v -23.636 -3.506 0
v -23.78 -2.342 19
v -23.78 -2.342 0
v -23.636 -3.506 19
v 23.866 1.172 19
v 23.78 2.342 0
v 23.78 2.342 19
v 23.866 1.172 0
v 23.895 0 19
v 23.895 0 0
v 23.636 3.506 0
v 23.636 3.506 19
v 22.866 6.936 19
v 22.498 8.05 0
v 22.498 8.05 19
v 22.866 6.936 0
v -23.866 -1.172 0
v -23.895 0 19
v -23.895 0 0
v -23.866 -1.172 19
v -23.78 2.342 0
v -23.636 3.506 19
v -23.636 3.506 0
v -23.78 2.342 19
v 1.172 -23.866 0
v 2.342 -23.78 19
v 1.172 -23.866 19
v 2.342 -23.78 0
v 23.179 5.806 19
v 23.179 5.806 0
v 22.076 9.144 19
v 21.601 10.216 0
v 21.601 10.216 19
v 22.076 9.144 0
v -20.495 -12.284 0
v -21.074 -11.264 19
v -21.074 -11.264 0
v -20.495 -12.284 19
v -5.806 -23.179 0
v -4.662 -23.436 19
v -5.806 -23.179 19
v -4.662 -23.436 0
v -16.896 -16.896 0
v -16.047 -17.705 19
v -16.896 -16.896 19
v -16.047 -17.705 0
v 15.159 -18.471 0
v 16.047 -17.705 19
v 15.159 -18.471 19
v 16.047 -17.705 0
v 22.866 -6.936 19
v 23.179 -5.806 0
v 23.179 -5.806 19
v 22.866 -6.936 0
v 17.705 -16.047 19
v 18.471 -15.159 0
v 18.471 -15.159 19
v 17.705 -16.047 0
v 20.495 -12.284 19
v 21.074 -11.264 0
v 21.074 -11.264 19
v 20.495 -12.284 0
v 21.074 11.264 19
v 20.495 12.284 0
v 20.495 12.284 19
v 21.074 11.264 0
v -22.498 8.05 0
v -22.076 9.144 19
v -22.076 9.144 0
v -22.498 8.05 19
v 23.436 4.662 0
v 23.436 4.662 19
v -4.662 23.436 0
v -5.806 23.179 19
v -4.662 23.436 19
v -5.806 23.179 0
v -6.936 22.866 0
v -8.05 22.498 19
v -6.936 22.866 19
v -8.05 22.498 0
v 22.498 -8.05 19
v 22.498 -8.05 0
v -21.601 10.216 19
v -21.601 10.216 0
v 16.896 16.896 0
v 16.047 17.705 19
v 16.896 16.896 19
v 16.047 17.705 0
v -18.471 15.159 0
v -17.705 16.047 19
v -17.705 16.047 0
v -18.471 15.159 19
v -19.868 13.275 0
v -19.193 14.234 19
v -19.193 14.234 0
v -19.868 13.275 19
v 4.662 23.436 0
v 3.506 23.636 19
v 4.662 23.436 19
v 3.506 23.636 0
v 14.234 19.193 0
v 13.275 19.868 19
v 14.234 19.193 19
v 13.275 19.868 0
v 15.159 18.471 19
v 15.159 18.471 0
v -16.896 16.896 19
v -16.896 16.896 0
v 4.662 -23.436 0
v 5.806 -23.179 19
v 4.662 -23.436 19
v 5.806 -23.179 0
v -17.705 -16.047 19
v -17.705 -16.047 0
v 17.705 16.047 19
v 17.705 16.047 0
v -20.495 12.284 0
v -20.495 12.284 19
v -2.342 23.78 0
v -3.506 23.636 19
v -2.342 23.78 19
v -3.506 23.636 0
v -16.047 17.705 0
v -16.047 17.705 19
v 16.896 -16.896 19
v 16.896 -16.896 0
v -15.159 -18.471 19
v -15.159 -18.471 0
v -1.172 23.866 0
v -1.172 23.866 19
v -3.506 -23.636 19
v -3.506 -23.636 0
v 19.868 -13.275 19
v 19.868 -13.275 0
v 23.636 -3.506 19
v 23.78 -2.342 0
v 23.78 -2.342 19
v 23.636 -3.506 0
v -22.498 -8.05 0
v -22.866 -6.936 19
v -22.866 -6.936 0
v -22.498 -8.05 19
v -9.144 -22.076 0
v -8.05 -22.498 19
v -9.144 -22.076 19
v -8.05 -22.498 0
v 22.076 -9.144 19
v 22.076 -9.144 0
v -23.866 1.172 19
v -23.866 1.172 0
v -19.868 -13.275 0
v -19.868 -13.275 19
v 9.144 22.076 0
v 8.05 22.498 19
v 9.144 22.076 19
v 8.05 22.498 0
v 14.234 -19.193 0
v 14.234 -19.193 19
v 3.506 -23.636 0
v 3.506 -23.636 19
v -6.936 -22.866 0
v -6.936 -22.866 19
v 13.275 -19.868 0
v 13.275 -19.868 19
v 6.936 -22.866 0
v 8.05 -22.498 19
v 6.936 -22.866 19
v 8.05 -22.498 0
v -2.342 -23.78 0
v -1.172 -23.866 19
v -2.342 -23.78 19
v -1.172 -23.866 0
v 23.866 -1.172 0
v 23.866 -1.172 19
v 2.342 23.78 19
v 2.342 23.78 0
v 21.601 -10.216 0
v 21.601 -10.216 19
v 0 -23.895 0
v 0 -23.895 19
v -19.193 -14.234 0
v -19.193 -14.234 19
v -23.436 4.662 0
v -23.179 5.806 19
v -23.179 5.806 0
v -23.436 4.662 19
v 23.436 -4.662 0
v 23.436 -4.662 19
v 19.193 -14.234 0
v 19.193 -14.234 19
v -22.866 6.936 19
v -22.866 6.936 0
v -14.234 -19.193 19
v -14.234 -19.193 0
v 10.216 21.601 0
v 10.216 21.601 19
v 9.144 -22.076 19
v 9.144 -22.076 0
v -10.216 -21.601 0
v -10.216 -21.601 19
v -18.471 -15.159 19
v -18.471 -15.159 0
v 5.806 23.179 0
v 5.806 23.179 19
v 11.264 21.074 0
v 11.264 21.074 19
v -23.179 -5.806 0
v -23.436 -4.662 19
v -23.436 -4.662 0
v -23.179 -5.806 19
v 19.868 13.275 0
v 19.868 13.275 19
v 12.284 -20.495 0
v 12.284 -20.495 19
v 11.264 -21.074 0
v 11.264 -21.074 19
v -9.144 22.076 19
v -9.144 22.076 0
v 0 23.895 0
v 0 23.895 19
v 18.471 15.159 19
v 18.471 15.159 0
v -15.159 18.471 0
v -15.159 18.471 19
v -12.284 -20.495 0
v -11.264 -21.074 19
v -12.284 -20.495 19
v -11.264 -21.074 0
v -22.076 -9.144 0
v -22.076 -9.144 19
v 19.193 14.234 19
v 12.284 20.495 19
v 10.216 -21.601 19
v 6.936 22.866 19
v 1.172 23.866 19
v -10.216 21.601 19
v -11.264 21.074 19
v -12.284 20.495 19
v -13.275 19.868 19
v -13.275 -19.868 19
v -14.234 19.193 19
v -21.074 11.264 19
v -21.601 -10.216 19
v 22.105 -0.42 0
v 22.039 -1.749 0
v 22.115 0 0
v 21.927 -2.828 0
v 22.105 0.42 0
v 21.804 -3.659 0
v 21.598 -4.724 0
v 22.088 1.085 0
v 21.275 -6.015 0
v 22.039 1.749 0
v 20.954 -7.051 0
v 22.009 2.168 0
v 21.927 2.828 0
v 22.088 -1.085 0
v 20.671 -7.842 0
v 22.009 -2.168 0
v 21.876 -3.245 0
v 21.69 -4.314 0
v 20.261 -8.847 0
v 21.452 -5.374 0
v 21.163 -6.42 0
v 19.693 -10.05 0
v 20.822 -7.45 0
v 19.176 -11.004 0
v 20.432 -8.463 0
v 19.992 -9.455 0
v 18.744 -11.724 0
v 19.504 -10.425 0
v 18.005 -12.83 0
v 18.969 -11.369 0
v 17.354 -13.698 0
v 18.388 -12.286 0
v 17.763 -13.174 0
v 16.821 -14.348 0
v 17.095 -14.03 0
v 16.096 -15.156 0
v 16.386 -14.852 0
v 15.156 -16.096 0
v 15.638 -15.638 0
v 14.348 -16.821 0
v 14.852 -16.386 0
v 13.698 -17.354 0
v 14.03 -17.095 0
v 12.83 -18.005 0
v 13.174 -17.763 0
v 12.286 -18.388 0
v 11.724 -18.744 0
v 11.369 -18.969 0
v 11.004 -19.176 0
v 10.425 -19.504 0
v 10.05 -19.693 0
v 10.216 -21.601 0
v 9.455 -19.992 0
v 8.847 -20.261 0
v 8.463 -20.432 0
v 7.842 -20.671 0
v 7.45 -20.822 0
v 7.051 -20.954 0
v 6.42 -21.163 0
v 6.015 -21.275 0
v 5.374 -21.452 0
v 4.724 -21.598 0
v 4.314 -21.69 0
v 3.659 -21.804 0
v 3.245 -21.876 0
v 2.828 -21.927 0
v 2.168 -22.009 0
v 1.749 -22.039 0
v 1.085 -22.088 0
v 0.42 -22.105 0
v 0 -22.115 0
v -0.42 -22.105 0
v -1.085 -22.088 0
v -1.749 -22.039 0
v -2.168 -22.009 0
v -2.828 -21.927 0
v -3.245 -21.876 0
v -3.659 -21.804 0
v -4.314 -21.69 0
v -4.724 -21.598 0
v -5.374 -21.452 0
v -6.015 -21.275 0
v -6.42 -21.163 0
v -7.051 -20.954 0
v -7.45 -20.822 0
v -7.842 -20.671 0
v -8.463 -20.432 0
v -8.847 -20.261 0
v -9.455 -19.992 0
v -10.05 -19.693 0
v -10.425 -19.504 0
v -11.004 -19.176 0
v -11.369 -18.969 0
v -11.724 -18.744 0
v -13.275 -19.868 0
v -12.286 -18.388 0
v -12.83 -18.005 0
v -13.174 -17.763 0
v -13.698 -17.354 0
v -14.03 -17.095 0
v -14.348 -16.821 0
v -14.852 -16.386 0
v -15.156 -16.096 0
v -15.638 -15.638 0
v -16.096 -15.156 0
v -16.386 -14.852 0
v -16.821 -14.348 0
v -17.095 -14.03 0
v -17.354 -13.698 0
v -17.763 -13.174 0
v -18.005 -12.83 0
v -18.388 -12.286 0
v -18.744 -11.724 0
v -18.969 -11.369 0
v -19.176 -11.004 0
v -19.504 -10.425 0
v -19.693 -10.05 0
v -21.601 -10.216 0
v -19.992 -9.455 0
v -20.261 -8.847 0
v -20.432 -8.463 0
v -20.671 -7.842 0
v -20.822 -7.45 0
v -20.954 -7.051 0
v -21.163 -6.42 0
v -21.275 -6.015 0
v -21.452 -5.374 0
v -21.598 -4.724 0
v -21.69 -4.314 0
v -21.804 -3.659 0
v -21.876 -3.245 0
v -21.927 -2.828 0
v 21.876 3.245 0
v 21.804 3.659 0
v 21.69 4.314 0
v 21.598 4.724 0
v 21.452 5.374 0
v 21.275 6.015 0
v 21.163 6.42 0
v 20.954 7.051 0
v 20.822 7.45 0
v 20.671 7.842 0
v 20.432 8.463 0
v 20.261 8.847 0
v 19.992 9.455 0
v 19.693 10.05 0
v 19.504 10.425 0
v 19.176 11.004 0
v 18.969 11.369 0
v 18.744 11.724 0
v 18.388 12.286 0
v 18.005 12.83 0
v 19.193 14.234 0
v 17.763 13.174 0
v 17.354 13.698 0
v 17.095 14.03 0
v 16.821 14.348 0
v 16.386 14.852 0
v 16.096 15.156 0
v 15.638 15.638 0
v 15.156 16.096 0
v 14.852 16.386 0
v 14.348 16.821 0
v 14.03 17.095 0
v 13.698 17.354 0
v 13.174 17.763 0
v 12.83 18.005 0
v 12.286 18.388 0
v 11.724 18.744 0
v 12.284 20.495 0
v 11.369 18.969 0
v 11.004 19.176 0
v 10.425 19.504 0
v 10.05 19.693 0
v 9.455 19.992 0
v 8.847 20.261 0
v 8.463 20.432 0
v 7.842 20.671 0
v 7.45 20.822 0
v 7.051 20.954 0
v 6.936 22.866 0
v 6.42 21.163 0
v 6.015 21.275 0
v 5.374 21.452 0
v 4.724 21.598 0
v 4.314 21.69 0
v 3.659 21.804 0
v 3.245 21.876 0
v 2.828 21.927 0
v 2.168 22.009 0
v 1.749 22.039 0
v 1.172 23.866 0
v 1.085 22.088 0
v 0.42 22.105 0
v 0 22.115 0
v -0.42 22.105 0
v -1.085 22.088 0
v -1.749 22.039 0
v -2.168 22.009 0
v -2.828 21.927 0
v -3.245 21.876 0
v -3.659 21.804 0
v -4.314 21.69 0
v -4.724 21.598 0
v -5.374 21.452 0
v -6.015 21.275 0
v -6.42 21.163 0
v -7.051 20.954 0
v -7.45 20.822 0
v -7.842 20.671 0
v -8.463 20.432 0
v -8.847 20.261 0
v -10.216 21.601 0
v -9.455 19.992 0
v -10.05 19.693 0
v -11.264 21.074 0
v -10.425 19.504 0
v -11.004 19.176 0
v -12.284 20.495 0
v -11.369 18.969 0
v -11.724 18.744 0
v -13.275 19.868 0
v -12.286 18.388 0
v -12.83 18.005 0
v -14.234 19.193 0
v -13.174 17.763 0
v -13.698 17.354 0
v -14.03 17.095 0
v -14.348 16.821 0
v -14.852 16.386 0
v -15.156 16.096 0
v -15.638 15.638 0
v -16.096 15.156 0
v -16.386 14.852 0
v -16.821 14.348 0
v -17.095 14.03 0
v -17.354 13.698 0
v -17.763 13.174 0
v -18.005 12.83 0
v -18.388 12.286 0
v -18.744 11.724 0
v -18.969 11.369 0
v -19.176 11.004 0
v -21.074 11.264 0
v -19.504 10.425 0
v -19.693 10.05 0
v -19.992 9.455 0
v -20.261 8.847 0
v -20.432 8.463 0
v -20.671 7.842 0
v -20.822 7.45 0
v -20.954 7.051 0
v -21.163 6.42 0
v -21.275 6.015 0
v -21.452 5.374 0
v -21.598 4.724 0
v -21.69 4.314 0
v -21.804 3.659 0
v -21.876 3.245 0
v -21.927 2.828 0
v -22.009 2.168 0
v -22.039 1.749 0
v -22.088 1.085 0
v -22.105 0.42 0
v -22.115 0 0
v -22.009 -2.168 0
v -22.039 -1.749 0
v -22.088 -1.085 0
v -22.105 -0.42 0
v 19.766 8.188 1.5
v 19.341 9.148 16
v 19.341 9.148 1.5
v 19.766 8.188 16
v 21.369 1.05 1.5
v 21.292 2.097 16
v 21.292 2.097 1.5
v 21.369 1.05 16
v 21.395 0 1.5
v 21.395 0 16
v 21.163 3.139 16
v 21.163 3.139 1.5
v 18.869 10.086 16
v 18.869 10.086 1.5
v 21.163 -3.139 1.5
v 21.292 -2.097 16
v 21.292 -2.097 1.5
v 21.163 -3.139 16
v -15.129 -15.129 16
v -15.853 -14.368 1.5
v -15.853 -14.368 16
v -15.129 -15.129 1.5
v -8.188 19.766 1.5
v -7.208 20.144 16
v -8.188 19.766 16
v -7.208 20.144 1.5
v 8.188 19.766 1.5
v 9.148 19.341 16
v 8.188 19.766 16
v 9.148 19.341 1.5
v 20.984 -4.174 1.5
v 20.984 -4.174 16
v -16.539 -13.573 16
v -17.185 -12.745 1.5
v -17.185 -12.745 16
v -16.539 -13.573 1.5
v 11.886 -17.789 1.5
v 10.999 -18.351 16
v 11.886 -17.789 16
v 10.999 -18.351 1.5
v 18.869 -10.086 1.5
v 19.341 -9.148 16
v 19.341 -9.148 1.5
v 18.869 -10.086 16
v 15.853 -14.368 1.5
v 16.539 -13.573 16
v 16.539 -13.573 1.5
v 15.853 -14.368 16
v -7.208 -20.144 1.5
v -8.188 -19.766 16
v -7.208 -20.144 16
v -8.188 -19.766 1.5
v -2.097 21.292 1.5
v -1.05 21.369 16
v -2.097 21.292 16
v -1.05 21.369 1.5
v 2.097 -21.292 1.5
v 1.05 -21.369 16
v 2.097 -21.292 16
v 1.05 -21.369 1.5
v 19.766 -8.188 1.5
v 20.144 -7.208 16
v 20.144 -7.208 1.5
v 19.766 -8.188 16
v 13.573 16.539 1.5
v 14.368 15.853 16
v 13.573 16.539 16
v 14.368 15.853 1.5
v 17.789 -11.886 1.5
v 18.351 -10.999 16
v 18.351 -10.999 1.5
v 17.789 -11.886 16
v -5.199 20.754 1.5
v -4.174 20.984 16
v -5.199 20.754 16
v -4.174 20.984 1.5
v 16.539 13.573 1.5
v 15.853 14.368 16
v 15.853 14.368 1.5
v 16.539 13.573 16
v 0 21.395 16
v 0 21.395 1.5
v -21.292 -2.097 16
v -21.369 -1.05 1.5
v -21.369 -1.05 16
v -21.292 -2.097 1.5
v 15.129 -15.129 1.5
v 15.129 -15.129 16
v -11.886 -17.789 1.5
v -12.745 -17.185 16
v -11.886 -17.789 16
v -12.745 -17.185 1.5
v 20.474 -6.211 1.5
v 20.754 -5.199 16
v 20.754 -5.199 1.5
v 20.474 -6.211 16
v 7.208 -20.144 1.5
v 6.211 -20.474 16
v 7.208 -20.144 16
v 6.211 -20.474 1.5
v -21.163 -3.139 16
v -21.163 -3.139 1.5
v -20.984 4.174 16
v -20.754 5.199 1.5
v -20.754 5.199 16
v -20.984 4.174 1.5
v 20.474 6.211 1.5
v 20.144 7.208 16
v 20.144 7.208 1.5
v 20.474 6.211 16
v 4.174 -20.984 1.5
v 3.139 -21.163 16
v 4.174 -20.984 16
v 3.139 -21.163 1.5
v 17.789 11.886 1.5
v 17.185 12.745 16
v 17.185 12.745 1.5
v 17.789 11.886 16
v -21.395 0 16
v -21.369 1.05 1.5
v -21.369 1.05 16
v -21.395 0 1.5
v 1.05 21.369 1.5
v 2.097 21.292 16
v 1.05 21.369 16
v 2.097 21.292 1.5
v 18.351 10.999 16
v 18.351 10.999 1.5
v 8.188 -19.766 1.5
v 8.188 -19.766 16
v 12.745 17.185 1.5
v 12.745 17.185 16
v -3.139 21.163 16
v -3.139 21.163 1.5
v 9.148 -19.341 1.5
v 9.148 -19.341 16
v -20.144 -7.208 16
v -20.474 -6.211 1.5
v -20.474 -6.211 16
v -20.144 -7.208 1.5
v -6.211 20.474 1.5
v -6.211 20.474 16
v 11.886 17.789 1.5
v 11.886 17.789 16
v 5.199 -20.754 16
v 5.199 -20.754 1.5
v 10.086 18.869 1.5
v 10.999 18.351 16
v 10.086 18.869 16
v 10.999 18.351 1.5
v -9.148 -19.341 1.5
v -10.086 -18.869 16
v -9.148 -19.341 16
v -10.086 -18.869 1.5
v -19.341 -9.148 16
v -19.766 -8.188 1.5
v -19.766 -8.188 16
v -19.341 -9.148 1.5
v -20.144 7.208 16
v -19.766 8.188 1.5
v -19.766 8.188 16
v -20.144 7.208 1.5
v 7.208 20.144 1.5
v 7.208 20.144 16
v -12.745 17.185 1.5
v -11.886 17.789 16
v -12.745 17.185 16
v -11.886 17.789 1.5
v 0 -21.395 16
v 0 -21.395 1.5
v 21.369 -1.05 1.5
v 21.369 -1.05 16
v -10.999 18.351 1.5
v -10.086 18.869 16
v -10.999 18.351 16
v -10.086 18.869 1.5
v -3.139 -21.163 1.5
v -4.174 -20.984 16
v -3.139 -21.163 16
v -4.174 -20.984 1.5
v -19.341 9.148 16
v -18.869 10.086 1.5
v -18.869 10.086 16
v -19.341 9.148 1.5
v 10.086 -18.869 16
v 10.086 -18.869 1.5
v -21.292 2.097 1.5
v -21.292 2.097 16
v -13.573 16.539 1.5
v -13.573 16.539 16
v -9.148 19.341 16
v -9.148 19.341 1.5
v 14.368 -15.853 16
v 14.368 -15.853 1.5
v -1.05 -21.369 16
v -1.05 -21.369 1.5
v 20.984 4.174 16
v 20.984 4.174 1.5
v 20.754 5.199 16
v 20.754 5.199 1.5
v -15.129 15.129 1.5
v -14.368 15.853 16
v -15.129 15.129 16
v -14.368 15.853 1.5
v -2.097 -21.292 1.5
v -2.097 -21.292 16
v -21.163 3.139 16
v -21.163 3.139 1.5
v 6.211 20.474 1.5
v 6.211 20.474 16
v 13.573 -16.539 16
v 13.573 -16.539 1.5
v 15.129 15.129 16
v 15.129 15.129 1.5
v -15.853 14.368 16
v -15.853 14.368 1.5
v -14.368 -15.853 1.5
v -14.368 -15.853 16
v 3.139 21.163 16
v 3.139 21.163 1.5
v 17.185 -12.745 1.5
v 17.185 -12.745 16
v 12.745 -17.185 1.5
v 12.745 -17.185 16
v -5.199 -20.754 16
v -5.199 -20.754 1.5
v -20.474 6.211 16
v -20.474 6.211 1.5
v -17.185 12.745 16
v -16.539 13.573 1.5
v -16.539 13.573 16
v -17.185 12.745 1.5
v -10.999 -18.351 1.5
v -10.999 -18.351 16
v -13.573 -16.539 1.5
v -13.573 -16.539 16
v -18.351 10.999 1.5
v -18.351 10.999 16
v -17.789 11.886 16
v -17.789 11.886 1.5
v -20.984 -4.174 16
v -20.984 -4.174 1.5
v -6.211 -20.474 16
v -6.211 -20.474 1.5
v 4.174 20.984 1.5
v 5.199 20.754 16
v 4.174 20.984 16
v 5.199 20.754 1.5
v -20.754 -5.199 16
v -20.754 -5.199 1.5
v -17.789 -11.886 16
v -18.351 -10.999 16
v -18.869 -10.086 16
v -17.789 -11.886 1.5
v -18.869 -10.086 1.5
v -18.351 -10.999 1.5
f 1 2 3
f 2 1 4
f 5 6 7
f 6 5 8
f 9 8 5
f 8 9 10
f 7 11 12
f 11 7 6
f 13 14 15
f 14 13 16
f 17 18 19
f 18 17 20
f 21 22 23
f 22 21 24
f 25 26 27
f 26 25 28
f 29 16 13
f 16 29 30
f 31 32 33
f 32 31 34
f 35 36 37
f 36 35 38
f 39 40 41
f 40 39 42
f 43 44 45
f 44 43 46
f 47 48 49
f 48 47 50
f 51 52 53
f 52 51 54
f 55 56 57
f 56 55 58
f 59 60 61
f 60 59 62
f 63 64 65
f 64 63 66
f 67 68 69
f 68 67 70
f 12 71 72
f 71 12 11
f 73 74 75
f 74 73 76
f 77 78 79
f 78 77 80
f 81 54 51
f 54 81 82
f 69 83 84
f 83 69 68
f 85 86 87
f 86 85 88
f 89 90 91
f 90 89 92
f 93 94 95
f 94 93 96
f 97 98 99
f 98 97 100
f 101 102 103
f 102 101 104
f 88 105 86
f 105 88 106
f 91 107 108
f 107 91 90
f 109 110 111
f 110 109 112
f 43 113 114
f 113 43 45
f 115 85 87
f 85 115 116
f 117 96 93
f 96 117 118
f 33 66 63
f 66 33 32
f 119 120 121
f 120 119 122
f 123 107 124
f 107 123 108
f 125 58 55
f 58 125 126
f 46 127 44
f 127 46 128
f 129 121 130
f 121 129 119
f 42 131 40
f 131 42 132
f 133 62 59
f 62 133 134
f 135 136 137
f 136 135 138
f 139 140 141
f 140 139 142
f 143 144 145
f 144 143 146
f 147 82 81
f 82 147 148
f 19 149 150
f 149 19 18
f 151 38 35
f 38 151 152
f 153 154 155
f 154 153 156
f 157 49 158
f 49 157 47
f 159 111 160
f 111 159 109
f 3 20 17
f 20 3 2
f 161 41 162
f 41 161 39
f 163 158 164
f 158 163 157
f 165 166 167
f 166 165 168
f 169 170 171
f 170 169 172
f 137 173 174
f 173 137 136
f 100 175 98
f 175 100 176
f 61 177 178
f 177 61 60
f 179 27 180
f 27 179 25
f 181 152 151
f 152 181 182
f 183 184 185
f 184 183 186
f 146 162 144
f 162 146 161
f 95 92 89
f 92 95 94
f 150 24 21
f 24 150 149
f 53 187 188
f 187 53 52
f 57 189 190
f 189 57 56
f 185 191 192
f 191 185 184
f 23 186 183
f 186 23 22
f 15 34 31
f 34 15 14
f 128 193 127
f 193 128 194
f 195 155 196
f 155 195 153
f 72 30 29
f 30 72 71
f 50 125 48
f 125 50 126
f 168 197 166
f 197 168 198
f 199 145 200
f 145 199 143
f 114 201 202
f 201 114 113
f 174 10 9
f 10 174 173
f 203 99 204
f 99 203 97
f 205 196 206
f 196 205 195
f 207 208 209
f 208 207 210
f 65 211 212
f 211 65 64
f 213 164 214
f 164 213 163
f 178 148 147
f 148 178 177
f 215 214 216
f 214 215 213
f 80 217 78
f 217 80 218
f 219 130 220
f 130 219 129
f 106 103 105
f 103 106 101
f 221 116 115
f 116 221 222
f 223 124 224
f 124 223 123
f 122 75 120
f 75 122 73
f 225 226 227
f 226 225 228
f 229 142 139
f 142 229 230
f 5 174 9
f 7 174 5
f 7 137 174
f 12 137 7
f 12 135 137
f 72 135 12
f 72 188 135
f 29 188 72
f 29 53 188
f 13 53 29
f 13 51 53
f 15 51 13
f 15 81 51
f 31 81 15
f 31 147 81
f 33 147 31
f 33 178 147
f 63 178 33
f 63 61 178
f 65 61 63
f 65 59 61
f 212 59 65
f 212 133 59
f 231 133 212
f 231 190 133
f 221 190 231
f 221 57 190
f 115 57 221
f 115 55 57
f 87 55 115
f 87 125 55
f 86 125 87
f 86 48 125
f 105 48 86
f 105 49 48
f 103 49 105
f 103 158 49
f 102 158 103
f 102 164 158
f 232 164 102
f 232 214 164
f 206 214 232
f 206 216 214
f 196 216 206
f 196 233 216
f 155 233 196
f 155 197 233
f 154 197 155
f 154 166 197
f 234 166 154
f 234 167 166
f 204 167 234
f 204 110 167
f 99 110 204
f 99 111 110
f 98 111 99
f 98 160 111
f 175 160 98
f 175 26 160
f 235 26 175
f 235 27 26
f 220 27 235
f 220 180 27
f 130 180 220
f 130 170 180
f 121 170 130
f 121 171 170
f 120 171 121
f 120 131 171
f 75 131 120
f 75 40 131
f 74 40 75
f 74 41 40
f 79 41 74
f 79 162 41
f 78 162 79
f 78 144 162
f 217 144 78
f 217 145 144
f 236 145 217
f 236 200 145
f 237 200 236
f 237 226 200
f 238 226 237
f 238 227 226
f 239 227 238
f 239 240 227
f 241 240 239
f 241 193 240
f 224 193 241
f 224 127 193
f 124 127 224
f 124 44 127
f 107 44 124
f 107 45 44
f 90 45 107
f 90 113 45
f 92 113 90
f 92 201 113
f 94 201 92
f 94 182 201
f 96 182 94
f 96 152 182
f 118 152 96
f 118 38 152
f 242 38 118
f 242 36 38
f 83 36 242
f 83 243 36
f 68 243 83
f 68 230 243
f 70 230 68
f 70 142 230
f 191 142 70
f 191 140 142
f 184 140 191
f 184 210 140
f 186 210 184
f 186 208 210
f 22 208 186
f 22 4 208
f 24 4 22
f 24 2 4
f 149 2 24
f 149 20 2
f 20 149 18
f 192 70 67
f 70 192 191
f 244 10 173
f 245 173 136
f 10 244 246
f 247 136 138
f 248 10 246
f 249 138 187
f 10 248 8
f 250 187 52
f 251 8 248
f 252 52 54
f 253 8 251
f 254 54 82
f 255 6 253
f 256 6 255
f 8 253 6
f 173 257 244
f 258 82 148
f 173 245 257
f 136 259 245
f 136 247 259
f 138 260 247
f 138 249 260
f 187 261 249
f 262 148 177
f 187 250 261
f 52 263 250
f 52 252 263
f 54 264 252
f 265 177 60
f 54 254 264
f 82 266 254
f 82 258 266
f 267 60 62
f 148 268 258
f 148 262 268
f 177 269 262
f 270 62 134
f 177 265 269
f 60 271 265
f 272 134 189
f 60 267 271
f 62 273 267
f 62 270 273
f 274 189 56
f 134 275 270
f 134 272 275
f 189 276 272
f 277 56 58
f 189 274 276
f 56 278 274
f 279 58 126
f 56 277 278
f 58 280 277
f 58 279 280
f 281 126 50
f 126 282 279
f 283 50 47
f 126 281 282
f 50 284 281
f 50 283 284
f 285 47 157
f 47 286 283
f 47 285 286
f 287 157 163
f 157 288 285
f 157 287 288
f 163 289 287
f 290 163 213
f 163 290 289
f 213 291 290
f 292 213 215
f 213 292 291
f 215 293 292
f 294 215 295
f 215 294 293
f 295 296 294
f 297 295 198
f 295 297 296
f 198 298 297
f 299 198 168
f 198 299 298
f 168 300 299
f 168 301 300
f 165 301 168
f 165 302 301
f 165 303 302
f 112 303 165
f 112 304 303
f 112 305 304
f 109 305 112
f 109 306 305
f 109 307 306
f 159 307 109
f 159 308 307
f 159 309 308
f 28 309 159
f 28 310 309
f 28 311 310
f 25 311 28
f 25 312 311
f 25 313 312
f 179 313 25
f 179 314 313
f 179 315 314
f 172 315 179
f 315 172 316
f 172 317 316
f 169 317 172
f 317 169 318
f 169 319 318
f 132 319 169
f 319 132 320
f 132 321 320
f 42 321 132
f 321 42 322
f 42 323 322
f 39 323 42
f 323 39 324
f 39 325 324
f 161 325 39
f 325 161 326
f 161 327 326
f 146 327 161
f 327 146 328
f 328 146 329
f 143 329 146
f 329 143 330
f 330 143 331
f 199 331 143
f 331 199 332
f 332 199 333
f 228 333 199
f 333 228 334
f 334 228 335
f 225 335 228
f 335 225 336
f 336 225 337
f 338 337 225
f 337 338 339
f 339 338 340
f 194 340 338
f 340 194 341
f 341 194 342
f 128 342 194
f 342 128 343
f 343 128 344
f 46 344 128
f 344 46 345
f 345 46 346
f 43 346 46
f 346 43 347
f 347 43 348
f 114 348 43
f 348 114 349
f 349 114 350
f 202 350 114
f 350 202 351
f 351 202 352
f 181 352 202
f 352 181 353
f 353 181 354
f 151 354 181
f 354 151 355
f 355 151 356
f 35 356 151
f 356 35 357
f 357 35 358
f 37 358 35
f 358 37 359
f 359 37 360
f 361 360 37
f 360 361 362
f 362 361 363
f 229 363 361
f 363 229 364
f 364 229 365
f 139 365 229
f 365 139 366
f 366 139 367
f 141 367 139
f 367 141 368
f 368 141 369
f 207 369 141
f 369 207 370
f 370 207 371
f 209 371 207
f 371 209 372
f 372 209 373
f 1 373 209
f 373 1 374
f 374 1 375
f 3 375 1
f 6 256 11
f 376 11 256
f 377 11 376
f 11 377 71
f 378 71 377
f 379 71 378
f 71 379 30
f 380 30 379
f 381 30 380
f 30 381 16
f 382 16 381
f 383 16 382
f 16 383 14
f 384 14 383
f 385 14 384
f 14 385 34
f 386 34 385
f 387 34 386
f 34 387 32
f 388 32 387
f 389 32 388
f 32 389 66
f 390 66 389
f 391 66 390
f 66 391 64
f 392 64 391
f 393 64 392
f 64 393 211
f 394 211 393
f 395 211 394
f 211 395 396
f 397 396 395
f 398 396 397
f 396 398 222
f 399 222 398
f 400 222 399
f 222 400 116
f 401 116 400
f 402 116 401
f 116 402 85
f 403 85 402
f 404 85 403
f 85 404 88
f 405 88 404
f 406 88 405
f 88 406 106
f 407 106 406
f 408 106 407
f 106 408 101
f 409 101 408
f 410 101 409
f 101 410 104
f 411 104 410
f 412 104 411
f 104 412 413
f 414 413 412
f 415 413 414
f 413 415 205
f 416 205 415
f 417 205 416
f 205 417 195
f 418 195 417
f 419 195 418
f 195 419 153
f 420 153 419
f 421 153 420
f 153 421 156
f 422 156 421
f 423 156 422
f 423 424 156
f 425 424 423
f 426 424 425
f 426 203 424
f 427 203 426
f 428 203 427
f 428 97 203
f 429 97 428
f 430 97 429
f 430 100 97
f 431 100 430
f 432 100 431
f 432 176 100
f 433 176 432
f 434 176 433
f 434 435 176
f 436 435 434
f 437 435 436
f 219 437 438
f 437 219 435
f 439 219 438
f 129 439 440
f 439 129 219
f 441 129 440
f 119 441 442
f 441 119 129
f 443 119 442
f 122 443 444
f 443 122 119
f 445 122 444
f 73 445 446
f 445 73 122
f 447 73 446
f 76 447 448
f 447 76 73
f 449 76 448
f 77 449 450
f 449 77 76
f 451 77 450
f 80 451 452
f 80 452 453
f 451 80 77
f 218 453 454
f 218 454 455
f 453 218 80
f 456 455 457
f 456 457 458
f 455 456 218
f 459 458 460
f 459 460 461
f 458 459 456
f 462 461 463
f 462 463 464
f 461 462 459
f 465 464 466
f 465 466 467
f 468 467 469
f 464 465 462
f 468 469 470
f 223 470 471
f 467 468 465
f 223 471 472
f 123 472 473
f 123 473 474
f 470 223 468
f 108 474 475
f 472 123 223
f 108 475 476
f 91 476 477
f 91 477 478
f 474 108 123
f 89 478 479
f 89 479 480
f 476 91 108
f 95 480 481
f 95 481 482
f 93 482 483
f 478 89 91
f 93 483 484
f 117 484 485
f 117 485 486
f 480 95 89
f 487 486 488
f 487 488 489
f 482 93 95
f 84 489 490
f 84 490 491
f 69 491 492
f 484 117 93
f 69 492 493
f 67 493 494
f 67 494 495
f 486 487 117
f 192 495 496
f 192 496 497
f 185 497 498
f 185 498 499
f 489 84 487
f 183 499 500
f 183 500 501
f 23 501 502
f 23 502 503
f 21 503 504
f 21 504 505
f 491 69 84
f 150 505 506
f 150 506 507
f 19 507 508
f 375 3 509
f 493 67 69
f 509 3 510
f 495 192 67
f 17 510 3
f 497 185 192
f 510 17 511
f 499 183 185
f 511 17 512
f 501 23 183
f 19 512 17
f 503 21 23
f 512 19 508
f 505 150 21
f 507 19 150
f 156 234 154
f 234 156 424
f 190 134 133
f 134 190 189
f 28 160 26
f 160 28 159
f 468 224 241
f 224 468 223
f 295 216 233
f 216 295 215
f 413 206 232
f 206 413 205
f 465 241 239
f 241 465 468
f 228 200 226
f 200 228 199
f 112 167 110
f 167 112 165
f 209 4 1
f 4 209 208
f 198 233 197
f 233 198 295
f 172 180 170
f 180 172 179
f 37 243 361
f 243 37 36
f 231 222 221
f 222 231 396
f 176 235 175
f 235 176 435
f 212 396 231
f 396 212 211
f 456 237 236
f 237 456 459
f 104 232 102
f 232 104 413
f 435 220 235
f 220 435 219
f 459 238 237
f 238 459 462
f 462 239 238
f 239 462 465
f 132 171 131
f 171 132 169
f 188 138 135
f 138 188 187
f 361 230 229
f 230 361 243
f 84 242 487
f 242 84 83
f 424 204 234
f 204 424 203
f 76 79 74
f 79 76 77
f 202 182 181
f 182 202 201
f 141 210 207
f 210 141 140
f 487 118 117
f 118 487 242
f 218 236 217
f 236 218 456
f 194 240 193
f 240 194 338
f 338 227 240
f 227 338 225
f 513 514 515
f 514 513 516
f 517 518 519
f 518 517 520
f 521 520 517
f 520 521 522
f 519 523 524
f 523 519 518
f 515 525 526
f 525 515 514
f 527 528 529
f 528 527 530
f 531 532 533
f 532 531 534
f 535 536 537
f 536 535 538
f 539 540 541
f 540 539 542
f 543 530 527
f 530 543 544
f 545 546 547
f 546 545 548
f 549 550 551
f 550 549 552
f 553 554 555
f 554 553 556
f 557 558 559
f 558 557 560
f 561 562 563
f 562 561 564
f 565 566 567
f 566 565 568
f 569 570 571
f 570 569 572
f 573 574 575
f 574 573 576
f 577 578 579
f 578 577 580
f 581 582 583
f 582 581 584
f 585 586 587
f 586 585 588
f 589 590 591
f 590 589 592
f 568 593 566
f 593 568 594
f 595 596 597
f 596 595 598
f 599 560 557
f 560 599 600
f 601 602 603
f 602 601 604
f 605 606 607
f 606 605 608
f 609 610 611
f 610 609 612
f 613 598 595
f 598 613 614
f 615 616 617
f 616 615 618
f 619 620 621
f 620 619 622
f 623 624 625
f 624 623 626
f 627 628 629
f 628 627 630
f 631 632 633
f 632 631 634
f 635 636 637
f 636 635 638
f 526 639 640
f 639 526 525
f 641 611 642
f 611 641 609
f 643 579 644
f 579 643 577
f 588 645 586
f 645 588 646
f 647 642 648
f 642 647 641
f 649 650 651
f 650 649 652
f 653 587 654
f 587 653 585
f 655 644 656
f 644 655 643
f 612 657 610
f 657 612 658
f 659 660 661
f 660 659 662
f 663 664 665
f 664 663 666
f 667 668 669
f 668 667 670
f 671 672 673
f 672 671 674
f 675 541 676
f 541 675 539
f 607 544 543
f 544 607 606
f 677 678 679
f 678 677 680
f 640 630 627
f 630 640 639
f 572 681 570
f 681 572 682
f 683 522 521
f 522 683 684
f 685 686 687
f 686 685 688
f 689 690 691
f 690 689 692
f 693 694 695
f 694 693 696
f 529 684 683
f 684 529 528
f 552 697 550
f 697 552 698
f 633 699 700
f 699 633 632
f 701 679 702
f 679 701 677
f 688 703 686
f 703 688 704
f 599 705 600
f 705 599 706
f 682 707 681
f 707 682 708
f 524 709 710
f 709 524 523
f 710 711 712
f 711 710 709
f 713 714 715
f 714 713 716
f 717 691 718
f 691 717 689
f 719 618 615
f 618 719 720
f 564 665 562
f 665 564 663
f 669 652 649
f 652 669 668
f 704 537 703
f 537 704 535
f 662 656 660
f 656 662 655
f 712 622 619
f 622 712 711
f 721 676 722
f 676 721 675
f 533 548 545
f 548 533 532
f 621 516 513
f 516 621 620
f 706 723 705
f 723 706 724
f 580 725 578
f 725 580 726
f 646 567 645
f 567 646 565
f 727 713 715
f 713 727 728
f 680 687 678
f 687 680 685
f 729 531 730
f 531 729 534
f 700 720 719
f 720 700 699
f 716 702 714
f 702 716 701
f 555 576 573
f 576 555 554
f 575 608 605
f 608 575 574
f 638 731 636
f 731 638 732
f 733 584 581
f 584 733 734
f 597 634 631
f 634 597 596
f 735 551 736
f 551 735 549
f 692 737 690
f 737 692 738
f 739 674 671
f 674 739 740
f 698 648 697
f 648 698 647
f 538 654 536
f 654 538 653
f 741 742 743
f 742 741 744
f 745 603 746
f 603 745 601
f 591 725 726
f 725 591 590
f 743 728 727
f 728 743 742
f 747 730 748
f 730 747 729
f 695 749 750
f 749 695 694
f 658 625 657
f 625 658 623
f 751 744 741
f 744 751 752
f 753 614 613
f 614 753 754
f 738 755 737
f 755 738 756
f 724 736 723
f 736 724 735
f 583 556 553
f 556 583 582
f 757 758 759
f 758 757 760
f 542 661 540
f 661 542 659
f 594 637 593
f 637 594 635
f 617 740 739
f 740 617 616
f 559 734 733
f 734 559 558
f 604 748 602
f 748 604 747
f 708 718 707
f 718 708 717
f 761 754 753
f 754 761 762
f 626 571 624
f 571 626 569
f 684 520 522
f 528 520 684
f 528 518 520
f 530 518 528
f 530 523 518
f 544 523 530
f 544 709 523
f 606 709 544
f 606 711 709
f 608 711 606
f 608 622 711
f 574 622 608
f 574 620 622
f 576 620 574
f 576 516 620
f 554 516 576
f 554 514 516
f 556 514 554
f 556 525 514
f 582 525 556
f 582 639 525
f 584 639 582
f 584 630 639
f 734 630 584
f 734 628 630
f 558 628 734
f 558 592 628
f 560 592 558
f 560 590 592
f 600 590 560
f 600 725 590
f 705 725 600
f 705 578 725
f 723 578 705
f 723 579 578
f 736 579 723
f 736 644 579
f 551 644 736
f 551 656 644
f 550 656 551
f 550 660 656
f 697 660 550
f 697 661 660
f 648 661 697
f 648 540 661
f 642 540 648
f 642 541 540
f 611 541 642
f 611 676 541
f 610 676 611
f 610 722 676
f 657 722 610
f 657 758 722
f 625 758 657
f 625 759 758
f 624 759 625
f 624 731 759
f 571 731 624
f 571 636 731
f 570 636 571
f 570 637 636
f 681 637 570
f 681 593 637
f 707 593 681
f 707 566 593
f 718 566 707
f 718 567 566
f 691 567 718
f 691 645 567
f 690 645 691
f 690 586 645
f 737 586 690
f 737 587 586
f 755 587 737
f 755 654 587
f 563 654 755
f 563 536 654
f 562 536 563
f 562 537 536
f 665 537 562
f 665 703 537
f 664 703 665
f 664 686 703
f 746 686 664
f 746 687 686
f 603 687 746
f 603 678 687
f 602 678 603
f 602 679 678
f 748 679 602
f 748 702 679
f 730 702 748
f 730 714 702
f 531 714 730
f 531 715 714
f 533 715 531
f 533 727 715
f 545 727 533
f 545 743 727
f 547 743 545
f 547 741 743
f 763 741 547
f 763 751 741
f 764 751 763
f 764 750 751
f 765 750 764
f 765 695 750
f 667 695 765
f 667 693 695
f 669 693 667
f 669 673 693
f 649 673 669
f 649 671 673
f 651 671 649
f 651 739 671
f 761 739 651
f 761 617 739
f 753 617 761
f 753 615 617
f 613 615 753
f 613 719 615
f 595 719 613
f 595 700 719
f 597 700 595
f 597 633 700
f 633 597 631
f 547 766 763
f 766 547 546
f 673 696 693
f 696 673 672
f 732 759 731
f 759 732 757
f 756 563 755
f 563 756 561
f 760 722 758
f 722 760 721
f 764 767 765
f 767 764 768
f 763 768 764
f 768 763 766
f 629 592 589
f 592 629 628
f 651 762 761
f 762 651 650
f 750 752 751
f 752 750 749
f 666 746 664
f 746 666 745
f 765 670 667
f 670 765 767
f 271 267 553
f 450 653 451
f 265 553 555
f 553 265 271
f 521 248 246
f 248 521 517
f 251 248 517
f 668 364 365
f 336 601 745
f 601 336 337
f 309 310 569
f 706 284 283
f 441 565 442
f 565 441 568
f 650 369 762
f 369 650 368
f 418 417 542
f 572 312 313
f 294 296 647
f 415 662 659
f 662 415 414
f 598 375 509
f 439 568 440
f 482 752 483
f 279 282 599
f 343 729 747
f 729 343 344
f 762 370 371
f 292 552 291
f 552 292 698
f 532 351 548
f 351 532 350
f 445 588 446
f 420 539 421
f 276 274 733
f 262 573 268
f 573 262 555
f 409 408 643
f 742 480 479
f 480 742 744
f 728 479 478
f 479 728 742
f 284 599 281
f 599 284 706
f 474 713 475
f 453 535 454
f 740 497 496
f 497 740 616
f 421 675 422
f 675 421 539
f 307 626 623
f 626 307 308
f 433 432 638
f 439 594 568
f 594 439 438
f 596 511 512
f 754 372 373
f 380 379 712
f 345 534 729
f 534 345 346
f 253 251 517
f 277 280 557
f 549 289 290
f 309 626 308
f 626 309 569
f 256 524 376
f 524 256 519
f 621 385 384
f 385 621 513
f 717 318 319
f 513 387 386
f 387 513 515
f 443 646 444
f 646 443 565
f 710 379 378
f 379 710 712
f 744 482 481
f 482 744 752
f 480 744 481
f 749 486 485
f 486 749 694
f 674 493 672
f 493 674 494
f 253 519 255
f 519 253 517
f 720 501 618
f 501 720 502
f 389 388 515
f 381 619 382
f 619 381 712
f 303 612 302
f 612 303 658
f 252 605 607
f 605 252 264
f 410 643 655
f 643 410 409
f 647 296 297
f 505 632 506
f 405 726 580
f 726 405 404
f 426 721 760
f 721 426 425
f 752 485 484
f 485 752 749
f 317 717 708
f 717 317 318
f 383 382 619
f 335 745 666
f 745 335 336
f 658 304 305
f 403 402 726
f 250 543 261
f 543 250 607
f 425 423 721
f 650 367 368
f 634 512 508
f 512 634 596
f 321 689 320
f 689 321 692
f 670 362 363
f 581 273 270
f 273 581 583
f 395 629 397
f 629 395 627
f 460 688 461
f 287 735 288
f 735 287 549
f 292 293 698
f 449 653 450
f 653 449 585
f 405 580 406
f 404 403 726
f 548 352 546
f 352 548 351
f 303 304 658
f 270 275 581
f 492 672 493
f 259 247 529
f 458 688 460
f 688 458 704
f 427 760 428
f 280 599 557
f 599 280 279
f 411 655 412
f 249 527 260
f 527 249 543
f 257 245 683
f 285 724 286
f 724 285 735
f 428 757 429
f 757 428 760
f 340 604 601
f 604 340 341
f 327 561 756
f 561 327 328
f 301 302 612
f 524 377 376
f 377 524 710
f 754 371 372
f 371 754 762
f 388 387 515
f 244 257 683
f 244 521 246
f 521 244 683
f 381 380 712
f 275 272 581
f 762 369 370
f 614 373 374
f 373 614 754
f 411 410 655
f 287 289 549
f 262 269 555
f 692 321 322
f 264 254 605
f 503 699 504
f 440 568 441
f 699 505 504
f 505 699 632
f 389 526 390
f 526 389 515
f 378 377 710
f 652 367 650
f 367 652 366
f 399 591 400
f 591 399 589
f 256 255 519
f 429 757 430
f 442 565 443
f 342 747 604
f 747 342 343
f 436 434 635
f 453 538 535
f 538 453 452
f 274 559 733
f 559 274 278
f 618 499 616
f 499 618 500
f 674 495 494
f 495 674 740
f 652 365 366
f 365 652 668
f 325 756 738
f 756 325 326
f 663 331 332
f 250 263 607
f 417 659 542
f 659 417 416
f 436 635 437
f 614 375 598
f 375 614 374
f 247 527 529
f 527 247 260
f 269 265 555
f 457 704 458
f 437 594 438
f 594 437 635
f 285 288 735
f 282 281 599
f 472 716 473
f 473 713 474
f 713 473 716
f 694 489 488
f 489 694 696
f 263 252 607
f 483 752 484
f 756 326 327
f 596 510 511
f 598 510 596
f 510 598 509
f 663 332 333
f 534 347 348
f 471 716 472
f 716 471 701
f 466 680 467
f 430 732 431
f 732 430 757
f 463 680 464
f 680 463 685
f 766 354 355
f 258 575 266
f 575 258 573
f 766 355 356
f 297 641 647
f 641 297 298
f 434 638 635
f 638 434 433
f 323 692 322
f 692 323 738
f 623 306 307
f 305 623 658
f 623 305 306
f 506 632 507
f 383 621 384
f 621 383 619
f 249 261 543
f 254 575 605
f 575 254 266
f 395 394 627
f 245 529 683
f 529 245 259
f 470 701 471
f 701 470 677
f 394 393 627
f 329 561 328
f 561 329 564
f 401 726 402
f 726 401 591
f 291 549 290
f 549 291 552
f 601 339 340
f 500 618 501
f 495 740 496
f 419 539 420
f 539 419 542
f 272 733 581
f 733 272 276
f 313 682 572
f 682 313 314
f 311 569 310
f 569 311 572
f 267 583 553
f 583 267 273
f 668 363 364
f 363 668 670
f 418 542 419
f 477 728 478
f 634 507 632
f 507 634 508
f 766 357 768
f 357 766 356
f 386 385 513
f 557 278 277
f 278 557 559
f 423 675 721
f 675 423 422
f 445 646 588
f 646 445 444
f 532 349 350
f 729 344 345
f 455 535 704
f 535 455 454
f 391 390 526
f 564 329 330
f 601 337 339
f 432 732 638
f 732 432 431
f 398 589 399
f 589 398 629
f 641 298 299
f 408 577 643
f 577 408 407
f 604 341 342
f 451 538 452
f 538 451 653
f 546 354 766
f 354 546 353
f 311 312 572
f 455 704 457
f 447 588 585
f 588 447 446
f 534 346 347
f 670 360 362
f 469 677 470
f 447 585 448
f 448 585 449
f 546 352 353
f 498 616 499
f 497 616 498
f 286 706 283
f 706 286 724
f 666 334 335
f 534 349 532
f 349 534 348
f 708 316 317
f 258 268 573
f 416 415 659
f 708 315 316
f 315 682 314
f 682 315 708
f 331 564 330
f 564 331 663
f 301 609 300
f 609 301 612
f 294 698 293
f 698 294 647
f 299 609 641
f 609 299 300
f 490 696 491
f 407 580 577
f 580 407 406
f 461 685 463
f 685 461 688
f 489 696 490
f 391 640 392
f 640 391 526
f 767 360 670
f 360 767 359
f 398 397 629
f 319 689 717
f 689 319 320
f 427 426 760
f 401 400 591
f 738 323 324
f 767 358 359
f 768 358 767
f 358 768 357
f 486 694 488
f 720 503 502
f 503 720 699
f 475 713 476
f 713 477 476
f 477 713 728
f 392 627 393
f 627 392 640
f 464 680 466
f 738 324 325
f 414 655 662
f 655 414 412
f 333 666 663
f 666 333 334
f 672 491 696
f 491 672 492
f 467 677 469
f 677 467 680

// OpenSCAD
// Slip-Fit Cap for 42.75mm OD Blade Guard Dust Port
// Configured with +0.35mm Shrinkage Compensation for smooth slip fit

$fn = 128; // High resolution for round cylinder walls

// Measured & Target Dimensions
//port_measured_od = 42.69; // Measured OD of metal/plastic guard port
port_measured_od = 42.69; // Measured OD of metal/plastic guard port

shrink_offset    = 0.1;  // CAD clearance to offset 3D printer internal shrinkage

cap_height       = 19.0;  // 19mm total height
wall_thick       = 2.5;   // 2.5mm cap wall thickness
top_thick        = 3.0;   // 3.0mm solid top end-cap thickness

// Calculated CAD Dimensions
cap_id = port_measured_od + shrink_offset; // ~43.10mm CAD hole
cap_od = cap_id + (2 * wall_thick);         // ~48.10mm Outer cap diameter

module guard_port_cap() {
    difference() {
        // Outer Cap Body
        cylinder(r = cap_od / 2, h = cap_height);
        
        // Internal Slip-Fit Chamber (Hollowed out from bottom)
        translate([0, 0, -1])
            cylinder(r = cap_id / 2, h = cap_height - top_thick + 1);
            
        // Lead-In Chamfer at bottom opening for easy slip-on insertion
        translate([0, 0, -1])
            cylinder(r1 = (cap_id / 2) + 1.2, r2 = cap_id / 2, h = 2.5);
    }
}

// Render on the build plate (Bottom opening resting on Z=0)
guard_port_cap();
